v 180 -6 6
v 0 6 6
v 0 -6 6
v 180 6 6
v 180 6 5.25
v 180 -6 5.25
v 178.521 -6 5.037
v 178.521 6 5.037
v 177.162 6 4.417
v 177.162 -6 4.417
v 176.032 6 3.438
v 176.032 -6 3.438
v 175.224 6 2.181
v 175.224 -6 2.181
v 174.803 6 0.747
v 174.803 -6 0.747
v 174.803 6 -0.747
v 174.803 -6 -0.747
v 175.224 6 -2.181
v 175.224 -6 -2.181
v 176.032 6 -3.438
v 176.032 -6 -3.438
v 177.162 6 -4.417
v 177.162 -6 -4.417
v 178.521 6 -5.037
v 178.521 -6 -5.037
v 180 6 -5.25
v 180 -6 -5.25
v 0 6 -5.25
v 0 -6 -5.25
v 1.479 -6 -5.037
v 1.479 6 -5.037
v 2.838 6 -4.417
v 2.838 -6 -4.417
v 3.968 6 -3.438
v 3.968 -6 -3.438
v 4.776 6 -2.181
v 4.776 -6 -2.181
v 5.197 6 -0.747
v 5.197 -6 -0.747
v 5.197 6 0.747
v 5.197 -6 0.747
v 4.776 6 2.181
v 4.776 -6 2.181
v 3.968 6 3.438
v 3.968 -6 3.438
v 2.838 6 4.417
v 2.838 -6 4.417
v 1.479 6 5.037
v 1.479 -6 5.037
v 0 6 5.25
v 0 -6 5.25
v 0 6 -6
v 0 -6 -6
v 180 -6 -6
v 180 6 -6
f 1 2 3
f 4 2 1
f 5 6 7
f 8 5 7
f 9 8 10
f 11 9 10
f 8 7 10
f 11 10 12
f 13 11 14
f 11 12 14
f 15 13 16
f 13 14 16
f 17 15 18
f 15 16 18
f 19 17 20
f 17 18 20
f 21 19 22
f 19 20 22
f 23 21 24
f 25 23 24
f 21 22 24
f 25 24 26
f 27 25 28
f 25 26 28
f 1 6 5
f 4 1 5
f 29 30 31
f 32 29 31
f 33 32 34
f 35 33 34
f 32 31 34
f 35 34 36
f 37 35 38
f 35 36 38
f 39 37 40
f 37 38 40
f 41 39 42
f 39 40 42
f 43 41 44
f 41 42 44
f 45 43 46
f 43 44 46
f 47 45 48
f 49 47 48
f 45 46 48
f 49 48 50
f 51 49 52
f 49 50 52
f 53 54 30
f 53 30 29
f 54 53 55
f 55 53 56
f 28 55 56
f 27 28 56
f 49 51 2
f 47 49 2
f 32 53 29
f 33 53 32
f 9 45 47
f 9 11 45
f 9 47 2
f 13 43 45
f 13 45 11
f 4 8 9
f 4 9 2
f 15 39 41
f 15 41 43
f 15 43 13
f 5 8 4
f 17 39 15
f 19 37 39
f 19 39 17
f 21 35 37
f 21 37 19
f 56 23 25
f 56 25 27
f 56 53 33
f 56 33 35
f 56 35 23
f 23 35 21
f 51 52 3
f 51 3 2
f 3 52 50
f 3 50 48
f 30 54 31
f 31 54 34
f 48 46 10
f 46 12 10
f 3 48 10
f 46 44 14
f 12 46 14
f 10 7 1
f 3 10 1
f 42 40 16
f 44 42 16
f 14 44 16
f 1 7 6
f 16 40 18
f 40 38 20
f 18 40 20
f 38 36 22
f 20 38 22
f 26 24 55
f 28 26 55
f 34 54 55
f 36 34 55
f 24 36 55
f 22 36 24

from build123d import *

# Parameters (mm, degrees)
BOX_W        = 180
BOX_H        = 12
BOX_DEPTH    = 12
POCKET_DEPTH = 12


with BuildPart() as part:
    # Box → Box (new body)
    with BuildSketch(Plane(origin=(0, -6, -6), x_dir=(1, 0, 0), z_dir=(0, 0, 1))):
        with Locations((90, 6)):
            Rectangle(BOX_W, BOX_H)
    extrude(amount=BOX_DEPTH)

    # Sketch → Pocket (cut)
    with BuildSketch(Plane(origin=(0, -6, -6), x_dir=(1, 0, 0), z_dir=(0, -1, 0))):
        with BuildLine():
            ThreePointArc((0, 0.75), (5.25, 6), (0, 11.25))
            Line((0, 11.25), (0, 0.75))
        make_face()
        with BuildLine():
            ThreePointArc((180, 11.25), (174.75, 6), (180, 0.75))
            Line((180, 11.25), (180, 0.75))
        make_face()
    extrude(amount=-POCKET_DEPTH, mode=Mode.SUBTRACT)


solid = part.part
